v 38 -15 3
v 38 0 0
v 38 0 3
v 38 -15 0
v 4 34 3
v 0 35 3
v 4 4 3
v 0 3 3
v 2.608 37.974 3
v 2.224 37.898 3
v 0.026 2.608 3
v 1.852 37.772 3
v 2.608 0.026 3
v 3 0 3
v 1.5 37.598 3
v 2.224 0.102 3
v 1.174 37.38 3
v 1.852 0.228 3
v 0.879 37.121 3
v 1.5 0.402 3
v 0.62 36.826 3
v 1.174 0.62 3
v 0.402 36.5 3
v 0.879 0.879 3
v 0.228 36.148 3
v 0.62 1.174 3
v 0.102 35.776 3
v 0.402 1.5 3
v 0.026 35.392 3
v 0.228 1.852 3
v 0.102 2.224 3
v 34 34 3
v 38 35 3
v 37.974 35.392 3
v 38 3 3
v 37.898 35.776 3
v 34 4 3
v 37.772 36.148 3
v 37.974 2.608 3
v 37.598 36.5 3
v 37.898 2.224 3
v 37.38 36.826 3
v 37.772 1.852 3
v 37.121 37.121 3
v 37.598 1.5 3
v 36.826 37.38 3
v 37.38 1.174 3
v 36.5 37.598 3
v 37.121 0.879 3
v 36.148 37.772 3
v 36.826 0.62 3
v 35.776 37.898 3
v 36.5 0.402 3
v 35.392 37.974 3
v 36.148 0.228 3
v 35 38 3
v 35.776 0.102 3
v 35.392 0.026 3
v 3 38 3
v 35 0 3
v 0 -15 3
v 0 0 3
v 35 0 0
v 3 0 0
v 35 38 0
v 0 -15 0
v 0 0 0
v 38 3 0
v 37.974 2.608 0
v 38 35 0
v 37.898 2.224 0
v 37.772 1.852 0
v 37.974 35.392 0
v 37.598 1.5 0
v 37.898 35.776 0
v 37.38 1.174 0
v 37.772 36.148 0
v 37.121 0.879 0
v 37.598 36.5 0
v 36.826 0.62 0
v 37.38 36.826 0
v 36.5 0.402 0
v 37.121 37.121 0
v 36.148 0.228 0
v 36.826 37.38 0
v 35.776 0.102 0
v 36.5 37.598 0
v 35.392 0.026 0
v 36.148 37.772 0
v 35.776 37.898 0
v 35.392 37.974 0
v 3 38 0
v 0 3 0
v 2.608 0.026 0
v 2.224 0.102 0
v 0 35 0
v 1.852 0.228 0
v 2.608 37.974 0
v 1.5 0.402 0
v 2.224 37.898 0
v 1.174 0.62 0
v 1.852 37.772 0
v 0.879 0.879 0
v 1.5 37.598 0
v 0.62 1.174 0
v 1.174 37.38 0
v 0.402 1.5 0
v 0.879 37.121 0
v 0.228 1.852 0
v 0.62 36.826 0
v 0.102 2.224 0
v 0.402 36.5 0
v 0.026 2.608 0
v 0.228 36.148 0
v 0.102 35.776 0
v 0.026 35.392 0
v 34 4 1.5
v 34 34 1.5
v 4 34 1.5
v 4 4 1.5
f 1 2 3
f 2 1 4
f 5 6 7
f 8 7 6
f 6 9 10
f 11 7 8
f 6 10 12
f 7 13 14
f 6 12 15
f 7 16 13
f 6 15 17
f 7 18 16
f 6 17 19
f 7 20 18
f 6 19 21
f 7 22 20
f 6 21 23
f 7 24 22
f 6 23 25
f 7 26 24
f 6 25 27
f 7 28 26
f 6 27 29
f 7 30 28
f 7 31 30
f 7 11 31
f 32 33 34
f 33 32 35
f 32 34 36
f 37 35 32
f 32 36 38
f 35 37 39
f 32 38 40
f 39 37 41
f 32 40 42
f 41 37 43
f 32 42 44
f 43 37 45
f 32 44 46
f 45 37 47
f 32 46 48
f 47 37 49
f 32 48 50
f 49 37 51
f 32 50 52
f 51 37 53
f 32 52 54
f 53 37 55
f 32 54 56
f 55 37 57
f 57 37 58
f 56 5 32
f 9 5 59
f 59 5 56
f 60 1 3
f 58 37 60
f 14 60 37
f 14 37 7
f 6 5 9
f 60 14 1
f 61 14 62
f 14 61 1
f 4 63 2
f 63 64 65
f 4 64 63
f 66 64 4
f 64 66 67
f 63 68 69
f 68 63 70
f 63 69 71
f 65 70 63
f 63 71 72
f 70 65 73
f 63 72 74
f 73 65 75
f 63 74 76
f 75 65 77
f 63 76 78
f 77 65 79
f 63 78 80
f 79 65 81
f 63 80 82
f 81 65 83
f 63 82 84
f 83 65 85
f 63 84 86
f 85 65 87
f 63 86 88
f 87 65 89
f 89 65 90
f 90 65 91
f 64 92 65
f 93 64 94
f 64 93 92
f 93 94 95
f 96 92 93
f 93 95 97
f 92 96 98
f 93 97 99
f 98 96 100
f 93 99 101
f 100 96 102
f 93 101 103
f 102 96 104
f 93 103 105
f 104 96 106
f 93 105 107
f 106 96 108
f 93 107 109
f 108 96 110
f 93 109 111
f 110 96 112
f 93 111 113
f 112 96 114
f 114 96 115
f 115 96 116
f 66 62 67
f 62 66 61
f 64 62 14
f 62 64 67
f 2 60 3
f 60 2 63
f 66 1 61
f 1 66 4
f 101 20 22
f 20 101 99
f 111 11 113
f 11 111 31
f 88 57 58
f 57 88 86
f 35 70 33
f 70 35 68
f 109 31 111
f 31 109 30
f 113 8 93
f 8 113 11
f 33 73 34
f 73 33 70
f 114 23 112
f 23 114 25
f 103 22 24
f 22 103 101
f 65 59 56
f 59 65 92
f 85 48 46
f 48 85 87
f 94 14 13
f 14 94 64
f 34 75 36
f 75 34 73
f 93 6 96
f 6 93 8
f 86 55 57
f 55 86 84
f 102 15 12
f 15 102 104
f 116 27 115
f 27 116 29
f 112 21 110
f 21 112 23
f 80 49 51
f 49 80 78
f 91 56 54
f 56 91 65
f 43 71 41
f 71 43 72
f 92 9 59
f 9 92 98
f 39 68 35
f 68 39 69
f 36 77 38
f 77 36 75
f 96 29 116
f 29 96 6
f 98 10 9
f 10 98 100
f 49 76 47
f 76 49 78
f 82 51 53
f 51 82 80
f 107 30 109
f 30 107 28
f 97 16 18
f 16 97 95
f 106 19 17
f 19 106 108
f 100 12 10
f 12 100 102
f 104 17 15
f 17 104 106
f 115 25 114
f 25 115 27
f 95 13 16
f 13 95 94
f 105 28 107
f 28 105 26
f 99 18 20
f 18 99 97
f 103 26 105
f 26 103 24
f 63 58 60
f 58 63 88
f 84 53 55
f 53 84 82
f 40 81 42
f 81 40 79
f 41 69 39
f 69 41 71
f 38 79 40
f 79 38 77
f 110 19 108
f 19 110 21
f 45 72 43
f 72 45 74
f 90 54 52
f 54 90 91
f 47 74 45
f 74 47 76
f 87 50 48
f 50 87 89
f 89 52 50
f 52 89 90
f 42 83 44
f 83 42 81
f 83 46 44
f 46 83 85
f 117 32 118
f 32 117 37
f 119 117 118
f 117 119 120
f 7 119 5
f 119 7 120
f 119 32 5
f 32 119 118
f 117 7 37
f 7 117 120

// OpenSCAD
// ============================================================
// BoxManage QR Holder - Parametric
// Parametric clip/frame that holds a QR code label and attaches
// to the edge or face of a storage box.
// ============================================================

/* [QR Code Settings] */
// Size of the QR code square (mm) - measure your printed sticker
qr_size = 30; // [15:100]

// Thickness of the pocket that holds the QR sticker (mm)
qr_pocket_depth = 1.5; // [0.5:0.1:3]

/* [Frame Settings] */
// Border width around the QR code (mm)
frame_border = 4; // [2:10]

// Overall thickness of the holder (mm)
frame_thickness = 3; // [2:8]

// Corner rounding radius (mm)
corner_radius = 3; // [0:0.5:8]

/* [Mounting] */
// Mounting style: "clip" = snaps onto box edge, "flat" = flat plate for glue/screw, "hole" = flat plate with screw holes
mount_type = "clip"; // [clip, flat, hole]

// --- Clip settings (used if mount_type = "clip") ---
// Thickness of the box wall/edge the clip grips (mm)
box_wall_thickness = 3; // [1:0.5:8]

// Depth of the clip that wraps around the edge (mm)
clip_depth = 15; // [8:40]

// Extra clearance so the clip isn't too tight (mm)
clip_clearance = 0.4; // [0:0.1:1]

// --- Screw hole settings (used if mount_type = "hole") ---
screw_hole_diameter = 3.2; // [2:0.1:6]
screw_hole_inset = 4; // distance from edge to hole center

/* [Rendering] */
$fn = 48;

// ============================================================
// Derived dimensions
// ============================================================
outer_size = qr_size + frame_border * 2;

// ============================================================
// Modules
// ============================================================

module rounded_square(size, radius) {
    hull() {
        for (x = [radius, size - radius])
            for (y = [radius, size - radius])
                translate([x, y, 0])
                    circle(r = radius);
    }
}

module qr_plate() {
    // Base plate with rounded corners
    linear_extrude(height = frame_thickness)
        rounded_square(outer_size, corner_radius);
}

module qr_pocket_cut() {
    // Recessed pocket for the QR sticker, centered, cut from the top
    translate([frame_border, frame_border, frame_thickness - qr_pocket_depth])
        cube([qr_size, qr_size, qr_pocket_depth + 0.5]);
}

module screw_holes() {
    positions = [
        [screw_hole_inset, screw_hole_inset],
        [outer_size - screw_hole_inset, screw_hole_inset],
        [screw_hole_inset, outer_size - screw_hole_inset],
        [outer_size - screw_hole_inset, outer_size - screw_hole_inset]
    ];
    for (p = positions)
        translate([p[0], p[1], -0.5])
            cylinder(h = frame_thickness + 1, d = screw_hole_diameter);
}

module clip_wrap() {
    // Wraps around the box edge: front plate + back tab, gripping box_wall_thickness
    gap = box_wall_thickness + clip_clearance;

    // Back tab (behind the box wall)
    translate([0, -clip_depth, 0])
        cube([outer_size, clip_depth, frame_thickness]);

    // Bridge connecting front plate to back tab, over the top edge of the wall
    translate([0, -gap - frame_thickness, 0])
        cube([outer_size, gap + frame_thickness, frame_thickness]);
}

// ============================================================
// Assembly
// ============================================================

module qr_holder() {
    difference() {
        union() {
            qr_plate();
            if (mount_type == "clip")
                clip_wrap();
        }
        qr_pocket_cut();
        if (mount_type == "hole")
            screw_holes();
    }
}

qr_holder();
